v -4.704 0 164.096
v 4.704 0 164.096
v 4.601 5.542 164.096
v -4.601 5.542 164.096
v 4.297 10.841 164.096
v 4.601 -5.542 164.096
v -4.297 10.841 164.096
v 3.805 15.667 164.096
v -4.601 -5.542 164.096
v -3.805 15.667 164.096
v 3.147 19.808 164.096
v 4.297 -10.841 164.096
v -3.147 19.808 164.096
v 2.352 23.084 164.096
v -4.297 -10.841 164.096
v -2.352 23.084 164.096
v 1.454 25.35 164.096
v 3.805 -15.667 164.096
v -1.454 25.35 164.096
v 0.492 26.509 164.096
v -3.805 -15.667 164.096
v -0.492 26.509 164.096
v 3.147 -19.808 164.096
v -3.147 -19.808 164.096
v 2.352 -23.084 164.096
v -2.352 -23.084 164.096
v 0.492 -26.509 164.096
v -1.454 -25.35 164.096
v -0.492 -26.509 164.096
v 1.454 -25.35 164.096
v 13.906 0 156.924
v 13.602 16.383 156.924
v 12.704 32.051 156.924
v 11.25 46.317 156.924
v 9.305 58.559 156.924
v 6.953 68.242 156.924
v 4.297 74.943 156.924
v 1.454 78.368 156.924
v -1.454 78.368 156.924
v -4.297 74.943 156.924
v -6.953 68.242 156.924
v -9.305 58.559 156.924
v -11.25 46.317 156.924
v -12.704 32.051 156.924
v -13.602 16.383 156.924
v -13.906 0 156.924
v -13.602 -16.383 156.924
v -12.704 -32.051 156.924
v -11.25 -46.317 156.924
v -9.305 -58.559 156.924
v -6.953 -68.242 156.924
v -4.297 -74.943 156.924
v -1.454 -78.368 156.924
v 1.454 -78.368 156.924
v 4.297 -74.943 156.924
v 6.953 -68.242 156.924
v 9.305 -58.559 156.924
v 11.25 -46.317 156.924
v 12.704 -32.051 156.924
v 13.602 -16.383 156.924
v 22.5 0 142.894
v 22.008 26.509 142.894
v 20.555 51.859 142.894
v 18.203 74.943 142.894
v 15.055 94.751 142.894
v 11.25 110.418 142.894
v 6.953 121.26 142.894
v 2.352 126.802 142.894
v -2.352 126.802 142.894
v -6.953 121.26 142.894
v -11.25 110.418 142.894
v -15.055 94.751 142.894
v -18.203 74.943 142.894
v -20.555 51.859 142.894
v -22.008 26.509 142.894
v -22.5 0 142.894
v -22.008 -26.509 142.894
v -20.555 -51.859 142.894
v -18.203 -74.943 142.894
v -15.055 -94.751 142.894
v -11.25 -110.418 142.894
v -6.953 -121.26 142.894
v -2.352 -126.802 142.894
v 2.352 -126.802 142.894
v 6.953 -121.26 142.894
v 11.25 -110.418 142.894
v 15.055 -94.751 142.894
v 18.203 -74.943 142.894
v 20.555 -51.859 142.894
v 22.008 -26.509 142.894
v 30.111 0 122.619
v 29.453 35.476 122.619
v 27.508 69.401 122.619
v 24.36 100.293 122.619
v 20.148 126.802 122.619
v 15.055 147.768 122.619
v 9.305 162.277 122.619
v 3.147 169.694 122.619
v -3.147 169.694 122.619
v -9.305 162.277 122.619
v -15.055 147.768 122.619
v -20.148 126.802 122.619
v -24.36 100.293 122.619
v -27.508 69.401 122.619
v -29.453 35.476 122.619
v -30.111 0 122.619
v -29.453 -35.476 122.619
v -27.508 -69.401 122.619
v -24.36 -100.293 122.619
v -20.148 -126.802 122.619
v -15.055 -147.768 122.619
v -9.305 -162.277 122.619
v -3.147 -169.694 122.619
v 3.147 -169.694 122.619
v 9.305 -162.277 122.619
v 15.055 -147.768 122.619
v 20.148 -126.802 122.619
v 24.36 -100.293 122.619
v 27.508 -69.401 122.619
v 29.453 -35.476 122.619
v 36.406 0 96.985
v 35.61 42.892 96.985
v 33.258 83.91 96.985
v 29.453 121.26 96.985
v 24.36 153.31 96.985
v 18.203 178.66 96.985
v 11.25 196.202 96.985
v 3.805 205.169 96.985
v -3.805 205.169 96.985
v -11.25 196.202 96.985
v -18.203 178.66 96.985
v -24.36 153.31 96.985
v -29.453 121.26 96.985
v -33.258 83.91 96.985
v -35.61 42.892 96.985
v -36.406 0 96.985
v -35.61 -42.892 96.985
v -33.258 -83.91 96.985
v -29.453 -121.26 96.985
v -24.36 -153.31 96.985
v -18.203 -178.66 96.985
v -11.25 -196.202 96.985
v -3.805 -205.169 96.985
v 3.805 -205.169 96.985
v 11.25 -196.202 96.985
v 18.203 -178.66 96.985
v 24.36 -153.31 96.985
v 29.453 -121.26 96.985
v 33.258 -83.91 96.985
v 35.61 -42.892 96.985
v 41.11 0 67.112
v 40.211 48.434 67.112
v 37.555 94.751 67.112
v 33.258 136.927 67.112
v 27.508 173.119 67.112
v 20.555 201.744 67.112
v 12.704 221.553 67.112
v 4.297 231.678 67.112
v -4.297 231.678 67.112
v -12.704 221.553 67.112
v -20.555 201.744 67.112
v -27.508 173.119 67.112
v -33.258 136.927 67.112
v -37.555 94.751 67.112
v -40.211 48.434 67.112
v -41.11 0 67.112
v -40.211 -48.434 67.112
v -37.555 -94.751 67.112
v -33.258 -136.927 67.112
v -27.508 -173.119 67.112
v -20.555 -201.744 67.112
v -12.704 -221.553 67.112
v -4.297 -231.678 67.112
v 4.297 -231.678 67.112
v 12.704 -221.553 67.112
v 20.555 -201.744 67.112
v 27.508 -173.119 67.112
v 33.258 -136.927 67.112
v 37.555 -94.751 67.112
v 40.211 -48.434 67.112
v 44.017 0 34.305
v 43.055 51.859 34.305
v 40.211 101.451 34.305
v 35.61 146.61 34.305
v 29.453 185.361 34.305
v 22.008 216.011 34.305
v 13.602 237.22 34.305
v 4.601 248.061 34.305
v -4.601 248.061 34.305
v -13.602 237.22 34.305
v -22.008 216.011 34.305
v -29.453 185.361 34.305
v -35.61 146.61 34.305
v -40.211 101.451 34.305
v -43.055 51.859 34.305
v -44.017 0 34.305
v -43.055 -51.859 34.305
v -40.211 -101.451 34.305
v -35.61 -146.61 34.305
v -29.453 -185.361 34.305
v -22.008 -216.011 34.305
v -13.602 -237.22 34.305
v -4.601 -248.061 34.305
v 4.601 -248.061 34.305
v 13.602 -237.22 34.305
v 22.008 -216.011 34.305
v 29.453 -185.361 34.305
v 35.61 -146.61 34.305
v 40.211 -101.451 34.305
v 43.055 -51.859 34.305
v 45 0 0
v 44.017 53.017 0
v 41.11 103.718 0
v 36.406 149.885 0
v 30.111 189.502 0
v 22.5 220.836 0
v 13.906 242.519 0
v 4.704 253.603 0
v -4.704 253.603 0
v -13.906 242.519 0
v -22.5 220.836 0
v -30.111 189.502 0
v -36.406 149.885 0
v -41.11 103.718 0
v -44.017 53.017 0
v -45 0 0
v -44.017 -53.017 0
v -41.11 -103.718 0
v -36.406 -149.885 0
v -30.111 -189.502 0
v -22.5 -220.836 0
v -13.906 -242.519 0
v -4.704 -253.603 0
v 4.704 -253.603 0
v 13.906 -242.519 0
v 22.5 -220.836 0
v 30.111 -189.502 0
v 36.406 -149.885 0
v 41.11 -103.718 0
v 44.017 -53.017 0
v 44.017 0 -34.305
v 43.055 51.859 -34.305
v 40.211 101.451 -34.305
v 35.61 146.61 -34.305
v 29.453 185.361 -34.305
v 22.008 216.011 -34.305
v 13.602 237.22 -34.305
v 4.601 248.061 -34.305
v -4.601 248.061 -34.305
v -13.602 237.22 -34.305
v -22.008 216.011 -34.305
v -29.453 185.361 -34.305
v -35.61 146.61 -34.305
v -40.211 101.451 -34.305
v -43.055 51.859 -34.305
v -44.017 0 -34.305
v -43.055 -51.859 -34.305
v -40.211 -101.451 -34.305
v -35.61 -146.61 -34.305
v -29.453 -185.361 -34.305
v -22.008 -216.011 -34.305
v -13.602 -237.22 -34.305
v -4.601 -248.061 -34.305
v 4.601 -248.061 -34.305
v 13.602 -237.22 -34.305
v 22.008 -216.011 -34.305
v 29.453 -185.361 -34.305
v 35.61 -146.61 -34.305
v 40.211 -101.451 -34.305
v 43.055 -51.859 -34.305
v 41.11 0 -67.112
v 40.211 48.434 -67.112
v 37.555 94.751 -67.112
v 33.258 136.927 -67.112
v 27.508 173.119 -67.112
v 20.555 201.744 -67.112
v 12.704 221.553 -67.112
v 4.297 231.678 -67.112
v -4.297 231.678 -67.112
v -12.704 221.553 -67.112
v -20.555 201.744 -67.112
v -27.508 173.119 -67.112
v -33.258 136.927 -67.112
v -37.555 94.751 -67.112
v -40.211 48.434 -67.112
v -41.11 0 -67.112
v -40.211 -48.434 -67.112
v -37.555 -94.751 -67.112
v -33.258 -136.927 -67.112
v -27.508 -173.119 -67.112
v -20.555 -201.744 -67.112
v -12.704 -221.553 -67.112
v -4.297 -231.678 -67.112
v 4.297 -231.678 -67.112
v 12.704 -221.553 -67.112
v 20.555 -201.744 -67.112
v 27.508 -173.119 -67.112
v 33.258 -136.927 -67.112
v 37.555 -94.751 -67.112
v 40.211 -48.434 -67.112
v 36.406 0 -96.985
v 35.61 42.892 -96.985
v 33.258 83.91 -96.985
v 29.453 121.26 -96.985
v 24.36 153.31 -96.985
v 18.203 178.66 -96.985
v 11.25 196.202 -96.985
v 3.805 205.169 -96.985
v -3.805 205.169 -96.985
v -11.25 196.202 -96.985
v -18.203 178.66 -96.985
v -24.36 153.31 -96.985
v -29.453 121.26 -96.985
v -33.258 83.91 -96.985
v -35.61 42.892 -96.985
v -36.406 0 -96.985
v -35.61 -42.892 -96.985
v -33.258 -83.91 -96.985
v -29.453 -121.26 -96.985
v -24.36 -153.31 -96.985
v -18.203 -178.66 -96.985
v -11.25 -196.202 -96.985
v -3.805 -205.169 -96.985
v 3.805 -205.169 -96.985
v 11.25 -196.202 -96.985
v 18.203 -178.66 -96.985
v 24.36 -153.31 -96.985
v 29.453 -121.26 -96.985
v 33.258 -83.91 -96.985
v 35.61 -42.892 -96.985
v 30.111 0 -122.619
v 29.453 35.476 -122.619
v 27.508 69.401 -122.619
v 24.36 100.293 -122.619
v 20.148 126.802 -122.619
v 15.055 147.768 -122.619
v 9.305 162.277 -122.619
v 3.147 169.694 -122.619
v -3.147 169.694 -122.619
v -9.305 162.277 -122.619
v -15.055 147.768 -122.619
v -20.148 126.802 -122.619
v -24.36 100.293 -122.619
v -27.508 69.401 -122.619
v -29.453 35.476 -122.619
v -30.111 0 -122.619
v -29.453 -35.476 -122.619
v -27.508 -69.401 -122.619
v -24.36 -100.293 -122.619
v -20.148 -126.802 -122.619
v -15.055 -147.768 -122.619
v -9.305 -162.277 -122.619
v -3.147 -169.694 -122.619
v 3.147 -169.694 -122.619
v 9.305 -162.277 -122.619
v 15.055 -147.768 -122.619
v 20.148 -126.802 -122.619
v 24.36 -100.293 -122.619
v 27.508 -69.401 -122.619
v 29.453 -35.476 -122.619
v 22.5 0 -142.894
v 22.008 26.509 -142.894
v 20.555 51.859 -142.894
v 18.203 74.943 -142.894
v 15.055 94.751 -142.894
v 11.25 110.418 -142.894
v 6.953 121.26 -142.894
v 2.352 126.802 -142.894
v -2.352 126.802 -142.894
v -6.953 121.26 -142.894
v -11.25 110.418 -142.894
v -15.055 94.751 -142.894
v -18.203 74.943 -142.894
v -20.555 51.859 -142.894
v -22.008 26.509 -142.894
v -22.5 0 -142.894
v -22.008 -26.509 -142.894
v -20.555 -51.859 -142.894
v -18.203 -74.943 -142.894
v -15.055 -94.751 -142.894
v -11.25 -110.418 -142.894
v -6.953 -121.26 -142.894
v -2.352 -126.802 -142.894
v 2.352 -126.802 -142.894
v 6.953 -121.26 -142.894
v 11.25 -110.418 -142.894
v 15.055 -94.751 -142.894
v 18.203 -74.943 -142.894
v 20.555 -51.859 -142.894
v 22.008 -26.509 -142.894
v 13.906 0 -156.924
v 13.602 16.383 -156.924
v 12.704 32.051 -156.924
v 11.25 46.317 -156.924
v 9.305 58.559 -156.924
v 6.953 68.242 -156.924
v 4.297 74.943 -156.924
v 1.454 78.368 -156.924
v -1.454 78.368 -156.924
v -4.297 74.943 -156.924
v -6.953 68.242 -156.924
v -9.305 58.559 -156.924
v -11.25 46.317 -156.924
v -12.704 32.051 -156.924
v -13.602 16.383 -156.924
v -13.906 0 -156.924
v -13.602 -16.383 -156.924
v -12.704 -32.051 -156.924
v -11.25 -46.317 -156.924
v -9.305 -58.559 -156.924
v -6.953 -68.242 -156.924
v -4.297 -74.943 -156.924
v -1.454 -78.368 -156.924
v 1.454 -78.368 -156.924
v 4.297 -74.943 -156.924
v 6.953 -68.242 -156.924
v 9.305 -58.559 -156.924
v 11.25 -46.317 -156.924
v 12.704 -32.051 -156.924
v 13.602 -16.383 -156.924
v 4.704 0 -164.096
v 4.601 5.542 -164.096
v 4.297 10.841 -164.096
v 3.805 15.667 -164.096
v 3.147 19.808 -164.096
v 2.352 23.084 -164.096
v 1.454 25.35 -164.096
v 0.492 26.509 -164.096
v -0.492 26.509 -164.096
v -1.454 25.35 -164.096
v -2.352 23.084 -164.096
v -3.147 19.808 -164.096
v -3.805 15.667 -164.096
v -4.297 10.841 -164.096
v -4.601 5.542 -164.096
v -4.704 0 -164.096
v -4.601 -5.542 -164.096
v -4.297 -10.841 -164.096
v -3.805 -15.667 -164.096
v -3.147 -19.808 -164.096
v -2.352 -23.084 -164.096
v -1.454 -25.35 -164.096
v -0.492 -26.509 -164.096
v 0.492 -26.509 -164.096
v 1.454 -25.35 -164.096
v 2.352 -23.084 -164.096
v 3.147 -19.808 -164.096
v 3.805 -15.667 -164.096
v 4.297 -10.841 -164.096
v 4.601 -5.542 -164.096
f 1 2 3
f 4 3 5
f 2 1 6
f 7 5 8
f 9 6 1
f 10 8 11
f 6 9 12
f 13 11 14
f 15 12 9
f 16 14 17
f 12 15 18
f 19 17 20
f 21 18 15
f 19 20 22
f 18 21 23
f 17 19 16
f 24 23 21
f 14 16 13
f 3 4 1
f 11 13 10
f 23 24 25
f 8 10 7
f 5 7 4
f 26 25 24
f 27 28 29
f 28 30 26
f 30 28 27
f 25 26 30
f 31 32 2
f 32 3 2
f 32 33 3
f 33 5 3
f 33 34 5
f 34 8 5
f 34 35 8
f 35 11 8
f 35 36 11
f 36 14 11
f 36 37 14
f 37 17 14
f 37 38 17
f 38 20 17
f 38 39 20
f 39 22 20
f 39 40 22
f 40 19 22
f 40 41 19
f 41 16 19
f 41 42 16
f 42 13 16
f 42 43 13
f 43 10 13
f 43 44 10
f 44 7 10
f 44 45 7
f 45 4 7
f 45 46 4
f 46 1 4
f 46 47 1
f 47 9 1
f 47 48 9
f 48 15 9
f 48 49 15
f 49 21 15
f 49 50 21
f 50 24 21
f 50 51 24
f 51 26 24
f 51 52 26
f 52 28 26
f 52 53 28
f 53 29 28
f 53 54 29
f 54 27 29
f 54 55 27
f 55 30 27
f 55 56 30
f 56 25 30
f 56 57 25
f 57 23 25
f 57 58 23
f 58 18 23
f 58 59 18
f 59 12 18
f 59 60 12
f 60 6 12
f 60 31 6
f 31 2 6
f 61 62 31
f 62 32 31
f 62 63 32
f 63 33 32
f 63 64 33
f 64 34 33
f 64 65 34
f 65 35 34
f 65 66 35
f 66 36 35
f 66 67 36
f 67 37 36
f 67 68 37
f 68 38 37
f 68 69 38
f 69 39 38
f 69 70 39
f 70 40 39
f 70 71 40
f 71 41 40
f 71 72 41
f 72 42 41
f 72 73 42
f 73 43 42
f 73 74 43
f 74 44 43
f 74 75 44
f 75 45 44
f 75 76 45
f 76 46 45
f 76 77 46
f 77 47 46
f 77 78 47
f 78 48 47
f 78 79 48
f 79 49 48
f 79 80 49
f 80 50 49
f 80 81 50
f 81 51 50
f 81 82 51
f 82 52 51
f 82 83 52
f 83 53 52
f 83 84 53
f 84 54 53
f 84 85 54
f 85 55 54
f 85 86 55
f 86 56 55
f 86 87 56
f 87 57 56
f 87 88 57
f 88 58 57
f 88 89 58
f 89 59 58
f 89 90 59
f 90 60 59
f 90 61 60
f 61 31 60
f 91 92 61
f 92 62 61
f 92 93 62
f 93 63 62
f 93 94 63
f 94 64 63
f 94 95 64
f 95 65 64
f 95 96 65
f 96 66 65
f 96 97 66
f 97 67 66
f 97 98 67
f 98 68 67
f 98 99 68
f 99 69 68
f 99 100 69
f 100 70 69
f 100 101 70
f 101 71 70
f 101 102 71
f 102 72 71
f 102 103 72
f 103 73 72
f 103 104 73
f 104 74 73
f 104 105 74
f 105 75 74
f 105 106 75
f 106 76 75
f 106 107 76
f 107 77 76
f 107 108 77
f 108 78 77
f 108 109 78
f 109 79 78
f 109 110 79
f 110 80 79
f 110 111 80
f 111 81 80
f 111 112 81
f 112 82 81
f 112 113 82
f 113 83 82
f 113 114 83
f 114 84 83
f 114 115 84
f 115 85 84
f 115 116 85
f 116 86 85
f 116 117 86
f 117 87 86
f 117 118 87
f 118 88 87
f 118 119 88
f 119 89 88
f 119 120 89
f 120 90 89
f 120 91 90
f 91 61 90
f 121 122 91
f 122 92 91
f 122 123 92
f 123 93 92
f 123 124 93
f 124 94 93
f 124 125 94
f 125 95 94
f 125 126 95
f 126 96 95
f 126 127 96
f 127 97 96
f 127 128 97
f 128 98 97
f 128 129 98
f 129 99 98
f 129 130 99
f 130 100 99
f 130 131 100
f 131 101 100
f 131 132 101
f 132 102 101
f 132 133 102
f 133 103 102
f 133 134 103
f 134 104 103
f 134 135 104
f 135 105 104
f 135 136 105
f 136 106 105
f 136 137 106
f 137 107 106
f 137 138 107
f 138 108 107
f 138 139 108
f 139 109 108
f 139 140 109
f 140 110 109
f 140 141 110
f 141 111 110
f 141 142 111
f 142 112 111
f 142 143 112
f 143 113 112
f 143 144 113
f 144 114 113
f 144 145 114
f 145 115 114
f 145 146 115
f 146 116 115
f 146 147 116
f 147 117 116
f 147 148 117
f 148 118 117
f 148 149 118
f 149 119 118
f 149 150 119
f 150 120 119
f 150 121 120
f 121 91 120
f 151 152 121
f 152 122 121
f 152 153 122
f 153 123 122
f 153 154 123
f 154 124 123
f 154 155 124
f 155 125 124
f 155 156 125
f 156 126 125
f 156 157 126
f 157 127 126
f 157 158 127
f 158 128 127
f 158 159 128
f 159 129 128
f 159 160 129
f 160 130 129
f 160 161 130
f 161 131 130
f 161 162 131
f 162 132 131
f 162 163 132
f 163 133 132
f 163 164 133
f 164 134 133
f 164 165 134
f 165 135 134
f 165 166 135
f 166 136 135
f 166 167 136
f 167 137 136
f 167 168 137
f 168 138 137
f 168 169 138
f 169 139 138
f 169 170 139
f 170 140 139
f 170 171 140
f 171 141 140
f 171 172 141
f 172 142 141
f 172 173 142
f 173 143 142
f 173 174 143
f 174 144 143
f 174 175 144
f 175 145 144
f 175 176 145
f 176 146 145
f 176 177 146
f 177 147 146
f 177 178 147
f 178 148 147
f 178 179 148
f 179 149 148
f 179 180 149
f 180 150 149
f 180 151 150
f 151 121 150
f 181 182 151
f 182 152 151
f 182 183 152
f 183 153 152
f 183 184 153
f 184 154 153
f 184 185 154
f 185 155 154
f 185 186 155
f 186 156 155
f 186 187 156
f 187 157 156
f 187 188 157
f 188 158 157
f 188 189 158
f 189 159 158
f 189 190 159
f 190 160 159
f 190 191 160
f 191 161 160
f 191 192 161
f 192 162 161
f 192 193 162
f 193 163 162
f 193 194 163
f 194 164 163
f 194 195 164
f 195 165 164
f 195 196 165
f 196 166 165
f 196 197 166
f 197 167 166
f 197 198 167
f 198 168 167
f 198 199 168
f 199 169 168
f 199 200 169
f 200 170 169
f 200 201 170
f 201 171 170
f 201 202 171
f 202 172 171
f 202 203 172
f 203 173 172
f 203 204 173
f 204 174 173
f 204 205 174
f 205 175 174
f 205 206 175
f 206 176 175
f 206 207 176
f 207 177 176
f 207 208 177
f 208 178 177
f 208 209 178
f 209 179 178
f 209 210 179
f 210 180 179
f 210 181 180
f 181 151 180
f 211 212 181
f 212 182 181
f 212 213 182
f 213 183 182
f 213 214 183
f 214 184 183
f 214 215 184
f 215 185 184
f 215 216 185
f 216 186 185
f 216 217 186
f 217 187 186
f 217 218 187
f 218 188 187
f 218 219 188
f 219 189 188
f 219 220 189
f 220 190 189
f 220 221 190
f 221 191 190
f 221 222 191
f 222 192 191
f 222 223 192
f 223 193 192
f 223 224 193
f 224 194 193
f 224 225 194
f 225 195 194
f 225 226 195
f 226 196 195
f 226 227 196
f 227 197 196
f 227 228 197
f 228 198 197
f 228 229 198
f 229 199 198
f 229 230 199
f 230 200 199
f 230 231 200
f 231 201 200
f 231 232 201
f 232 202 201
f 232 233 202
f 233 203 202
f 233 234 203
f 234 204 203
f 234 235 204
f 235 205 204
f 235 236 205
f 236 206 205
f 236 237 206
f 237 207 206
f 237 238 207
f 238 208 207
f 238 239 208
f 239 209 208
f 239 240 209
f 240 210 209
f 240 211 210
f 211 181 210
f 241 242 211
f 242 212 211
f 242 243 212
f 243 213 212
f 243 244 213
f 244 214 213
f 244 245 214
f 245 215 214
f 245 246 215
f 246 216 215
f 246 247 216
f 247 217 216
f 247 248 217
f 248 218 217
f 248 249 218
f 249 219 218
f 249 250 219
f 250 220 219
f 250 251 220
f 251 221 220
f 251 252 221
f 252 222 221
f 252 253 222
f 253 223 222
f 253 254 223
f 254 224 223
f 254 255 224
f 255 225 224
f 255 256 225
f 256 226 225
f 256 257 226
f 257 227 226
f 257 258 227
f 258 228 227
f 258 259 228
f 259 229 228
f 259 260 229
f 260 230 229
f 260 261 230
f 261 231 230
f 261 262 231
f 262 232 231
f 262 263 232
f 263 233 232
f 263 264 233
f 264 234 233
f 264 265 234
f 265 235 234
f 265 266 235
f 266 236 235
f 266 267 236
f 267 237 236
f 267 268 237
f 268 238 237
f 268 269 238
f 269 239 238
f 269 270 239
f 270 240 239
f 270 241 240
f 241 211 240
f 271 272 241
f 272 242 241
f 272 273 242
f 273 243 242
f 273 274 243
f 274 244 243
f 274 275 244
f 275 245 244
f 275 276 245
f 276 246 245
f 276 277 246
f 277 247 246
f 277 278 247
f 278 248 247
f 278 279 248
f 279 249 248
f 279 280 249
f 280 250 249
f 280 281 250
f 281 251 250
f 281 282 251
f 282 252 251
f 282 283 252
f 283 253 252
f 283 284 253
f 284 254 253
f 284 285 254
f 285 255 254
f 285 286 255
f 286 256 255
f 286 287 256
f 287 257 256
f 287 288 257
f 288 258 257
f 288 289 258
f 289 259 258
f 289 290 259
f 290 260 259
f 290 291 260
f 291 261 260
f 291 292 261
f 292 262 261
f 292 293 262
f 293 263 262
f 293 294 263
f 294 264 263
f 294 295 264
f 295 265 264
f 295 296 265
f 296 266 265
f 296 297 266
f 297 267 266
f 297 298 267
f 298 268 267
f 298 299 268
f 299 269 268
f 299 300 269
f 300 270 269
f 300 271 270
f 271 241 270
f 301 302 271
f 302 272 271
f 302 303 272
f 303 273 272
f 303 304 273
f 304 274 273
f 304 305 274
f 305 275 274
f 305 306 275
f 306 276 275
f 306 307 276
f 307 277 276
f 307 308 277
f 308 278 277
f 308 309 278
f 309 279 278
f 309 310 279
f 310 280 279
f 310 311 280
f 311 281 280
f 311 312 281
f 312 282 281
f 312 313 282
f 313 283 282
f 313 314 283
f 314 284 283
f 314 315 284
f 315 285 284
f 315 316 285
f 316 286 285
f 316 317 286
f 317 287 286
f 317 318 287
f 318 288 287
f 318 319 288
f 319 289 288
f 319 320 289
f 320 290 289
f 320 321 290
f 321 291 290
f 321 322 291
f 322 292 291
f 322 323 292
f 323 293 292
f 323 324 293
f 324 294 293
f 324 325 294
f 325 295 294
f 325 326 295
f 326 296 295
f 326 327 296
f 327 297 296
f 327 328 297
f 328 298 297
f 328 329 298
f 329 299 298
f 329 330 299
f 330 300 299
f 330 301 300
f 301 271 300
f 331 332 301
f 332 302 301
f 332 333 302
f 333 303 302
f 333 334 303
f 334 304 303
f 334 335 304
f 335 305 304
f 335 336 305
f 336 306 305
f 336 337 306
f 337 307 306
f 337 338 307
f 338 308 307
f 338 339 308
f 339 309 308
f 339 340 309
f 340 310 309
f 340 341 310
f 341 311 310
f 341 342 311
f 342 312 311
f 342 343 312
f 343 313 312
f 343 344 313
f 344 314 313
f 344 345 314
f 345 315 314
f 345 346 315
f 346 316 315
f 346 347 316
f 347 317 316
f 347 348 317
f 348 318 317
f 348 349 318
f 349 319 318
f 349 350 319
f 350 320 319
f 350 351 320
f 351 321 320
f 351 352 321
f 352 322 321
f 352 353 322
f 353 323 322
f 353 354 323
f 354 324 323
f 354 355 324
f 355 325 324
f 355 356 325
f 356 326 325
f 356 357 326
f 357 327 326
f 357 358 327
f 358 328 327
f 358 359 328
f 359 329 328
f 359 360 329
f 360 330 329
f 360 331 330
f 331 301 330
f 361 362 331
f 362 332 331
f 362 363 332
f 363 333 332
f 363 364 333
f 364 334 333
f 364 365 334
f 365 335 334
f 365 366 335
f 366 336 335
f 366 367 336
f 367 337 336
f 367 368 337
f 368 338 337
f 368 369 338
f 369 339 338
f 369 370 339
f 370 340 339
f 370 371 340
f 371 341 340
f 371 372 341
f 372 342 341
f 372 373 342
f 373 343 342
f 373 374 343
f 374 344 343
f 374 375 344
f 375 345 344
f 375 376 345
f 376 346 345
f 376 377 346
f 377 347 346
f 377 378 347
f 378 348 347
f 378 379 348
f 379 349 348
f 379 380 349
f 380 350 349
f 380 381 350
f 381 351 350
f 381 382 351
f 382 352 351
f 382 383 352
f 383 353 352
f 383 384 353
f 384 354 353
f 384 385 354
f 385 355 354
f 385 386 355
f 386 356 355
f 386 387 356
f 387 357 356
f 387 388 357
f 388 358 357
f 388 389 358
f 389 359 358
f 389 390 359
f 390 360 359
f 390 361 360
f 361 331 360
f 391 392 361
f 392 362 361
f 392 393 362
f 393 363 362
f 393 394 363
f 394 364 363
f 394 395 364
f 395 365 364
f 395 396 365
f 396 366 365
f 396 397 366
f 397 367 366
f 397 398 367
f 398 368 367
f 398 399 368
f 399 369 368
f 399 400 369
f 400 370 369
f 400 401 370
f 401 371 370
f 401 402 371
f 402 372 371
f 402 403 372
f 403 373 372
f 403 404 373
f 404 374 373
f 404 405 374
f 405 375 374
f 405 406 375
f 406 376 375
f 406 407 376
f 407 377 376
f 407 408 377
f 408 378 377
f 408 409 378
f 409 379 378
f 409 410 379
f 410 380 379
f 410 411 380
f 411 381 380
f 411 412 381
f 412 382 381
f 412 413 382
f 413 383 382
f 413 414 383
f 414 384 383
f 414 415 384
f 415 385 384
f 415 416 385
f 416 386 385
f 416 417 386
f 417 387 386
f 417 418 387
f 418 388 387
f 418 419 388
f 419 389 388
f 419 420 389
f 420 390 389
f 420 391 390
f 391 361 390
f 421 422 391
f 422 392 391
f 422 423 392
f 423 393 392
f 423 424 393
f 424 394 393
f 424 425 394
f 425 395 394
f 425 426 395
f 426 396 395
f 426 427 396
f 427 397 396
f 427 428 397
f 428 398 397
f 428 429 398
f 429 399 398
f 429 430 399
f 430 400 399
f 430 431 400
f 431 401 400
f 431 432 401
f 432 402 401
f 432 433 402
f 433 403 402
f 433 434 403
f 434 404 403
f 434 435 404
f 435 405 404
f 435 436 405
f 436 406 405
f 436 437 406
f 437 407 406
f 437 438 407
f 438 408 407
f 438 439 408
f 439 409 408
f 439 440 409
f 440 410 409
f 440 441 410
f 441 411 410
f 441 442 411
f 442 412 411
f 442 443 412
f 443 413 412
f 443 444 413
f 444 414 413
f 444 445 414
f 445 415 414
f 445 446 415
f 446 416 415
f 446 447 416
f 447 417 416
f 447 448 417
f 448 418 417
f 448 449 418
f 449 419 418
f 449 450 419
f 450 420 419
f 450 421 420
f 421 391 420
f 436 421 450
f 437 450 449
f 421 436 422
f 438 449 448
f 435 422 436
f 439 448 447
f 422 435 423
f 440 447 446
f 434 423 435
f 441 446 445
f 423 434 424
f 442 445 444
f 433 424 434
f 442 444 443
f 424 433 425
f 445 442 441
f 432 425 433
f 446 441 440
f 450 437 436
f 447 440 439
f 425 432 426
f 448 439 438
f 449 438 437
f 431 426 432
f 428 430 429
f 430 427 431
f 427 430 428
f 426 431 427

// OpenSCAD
// Generated by SolidPython 1.0.1 on 2020-07-29 00:46:46


scale(v = [3, 17, 11]) {
	sphere(r = 15);
}
/***********************************************
*********      SolidPython code:      **********
************************************************
 
# import packages: SolidPython
from solid import *
from solid.utils import *
from itertools import chain, combinations, permutations


class Resize:

    def __init__(self, scad_file):
        self.scad_file = scad_file
        #self.scad_file = import_scad(scad_file)
        # cone/cylinder param:
        self.r1 = 0
        self.r2 = 0
        self.h = 0
        # rectangular prism param:
        self.w = 0
        self.l = 0
        # ellipse param:
        self.r = 0

    # import OpenScad code (file name corresponds to shape)


    # classify shape + parameters
    def assign(self, param1, param2, param3):
        if self.scad_file == 'cone.scad':
            self.r1 = param1
            self.r2 = param2
            self.h = param3
        elif self.scad_file == 'cylinder.scad':
            self.r1 = param1
            self.r2 = param2
            self.h = param3
        elif self.scad_file == 'rectangularPrism.scad':
            self.h = param1
            self.l = param2
            self.w = param3
        else:
            self.r = param1
            self.h = param2

    # resize parameters
    def iterate(self):
        x = range(3, 20, 2)
        i = 1
        if self.scad_file == 'cone.scad':
            tempList = list(permutations(x, 2))
            for temp in tempList:
                param1 = temp[0]
                param2 = temp[1]
                filepath = 'produced_scad_files/' + 'cone' + str(param1) + '_' + str(param2) + '_' + '.scad'
                scad_render_to_file(cylinder(h=param1, r1=param2, r2=0), filepath)

        elif self.scad_file == 'cylinder.scad':
            tempList = list(permutations(x, 3))
            for temp in tempList:
                param1 = temp[0]
                param2 = temp[1]
                filepath = 'produced_scad_files/' + 'cylinder' + str(param1) + '_' + str(param2) + '_' + '.scad'
                scad_render_to_file(cylinder(h=param1, r1=param2, r2=param2), filepath)

        elif self.scad_file == 'rectangularPrism.scad':
            tempList = list(permutations(x, 3))
            for temp in tempList:
                param1 = temp[0]
                param2 = temp[1]
                param3 = temp[2]
                filepath = 'produced_scad_files/' + 'rectangularPrism' + str(param1) + '_' + str(param2) + '_' + str(
                    param3) + '.scad'
                scad_render_to_file(cube(size=(param1, param2, param3)), filepath)

        elif self.scad_file == 'ellipse.scad':
            tempList = list(permutations(x, 4))
            for temp in tempList:
                param1 = temp[0]
                param2 = temp[1]
                param3 = temp[2]
                param4 = temp[3]
                filepath = 'produced_scad_files/' + 'ellipse' + str(param1) + '_' + str(param2) + '_' + str(param3) + '_' + str(param4) + '.scad'
                scad_render_to_file(scale([param1, param2, param3])(sphere(r=param4)), filepath)

    def render_to_scadfile(self):
        scad_render_to_file(scad, 'example.scad') 
 
************************************************/
